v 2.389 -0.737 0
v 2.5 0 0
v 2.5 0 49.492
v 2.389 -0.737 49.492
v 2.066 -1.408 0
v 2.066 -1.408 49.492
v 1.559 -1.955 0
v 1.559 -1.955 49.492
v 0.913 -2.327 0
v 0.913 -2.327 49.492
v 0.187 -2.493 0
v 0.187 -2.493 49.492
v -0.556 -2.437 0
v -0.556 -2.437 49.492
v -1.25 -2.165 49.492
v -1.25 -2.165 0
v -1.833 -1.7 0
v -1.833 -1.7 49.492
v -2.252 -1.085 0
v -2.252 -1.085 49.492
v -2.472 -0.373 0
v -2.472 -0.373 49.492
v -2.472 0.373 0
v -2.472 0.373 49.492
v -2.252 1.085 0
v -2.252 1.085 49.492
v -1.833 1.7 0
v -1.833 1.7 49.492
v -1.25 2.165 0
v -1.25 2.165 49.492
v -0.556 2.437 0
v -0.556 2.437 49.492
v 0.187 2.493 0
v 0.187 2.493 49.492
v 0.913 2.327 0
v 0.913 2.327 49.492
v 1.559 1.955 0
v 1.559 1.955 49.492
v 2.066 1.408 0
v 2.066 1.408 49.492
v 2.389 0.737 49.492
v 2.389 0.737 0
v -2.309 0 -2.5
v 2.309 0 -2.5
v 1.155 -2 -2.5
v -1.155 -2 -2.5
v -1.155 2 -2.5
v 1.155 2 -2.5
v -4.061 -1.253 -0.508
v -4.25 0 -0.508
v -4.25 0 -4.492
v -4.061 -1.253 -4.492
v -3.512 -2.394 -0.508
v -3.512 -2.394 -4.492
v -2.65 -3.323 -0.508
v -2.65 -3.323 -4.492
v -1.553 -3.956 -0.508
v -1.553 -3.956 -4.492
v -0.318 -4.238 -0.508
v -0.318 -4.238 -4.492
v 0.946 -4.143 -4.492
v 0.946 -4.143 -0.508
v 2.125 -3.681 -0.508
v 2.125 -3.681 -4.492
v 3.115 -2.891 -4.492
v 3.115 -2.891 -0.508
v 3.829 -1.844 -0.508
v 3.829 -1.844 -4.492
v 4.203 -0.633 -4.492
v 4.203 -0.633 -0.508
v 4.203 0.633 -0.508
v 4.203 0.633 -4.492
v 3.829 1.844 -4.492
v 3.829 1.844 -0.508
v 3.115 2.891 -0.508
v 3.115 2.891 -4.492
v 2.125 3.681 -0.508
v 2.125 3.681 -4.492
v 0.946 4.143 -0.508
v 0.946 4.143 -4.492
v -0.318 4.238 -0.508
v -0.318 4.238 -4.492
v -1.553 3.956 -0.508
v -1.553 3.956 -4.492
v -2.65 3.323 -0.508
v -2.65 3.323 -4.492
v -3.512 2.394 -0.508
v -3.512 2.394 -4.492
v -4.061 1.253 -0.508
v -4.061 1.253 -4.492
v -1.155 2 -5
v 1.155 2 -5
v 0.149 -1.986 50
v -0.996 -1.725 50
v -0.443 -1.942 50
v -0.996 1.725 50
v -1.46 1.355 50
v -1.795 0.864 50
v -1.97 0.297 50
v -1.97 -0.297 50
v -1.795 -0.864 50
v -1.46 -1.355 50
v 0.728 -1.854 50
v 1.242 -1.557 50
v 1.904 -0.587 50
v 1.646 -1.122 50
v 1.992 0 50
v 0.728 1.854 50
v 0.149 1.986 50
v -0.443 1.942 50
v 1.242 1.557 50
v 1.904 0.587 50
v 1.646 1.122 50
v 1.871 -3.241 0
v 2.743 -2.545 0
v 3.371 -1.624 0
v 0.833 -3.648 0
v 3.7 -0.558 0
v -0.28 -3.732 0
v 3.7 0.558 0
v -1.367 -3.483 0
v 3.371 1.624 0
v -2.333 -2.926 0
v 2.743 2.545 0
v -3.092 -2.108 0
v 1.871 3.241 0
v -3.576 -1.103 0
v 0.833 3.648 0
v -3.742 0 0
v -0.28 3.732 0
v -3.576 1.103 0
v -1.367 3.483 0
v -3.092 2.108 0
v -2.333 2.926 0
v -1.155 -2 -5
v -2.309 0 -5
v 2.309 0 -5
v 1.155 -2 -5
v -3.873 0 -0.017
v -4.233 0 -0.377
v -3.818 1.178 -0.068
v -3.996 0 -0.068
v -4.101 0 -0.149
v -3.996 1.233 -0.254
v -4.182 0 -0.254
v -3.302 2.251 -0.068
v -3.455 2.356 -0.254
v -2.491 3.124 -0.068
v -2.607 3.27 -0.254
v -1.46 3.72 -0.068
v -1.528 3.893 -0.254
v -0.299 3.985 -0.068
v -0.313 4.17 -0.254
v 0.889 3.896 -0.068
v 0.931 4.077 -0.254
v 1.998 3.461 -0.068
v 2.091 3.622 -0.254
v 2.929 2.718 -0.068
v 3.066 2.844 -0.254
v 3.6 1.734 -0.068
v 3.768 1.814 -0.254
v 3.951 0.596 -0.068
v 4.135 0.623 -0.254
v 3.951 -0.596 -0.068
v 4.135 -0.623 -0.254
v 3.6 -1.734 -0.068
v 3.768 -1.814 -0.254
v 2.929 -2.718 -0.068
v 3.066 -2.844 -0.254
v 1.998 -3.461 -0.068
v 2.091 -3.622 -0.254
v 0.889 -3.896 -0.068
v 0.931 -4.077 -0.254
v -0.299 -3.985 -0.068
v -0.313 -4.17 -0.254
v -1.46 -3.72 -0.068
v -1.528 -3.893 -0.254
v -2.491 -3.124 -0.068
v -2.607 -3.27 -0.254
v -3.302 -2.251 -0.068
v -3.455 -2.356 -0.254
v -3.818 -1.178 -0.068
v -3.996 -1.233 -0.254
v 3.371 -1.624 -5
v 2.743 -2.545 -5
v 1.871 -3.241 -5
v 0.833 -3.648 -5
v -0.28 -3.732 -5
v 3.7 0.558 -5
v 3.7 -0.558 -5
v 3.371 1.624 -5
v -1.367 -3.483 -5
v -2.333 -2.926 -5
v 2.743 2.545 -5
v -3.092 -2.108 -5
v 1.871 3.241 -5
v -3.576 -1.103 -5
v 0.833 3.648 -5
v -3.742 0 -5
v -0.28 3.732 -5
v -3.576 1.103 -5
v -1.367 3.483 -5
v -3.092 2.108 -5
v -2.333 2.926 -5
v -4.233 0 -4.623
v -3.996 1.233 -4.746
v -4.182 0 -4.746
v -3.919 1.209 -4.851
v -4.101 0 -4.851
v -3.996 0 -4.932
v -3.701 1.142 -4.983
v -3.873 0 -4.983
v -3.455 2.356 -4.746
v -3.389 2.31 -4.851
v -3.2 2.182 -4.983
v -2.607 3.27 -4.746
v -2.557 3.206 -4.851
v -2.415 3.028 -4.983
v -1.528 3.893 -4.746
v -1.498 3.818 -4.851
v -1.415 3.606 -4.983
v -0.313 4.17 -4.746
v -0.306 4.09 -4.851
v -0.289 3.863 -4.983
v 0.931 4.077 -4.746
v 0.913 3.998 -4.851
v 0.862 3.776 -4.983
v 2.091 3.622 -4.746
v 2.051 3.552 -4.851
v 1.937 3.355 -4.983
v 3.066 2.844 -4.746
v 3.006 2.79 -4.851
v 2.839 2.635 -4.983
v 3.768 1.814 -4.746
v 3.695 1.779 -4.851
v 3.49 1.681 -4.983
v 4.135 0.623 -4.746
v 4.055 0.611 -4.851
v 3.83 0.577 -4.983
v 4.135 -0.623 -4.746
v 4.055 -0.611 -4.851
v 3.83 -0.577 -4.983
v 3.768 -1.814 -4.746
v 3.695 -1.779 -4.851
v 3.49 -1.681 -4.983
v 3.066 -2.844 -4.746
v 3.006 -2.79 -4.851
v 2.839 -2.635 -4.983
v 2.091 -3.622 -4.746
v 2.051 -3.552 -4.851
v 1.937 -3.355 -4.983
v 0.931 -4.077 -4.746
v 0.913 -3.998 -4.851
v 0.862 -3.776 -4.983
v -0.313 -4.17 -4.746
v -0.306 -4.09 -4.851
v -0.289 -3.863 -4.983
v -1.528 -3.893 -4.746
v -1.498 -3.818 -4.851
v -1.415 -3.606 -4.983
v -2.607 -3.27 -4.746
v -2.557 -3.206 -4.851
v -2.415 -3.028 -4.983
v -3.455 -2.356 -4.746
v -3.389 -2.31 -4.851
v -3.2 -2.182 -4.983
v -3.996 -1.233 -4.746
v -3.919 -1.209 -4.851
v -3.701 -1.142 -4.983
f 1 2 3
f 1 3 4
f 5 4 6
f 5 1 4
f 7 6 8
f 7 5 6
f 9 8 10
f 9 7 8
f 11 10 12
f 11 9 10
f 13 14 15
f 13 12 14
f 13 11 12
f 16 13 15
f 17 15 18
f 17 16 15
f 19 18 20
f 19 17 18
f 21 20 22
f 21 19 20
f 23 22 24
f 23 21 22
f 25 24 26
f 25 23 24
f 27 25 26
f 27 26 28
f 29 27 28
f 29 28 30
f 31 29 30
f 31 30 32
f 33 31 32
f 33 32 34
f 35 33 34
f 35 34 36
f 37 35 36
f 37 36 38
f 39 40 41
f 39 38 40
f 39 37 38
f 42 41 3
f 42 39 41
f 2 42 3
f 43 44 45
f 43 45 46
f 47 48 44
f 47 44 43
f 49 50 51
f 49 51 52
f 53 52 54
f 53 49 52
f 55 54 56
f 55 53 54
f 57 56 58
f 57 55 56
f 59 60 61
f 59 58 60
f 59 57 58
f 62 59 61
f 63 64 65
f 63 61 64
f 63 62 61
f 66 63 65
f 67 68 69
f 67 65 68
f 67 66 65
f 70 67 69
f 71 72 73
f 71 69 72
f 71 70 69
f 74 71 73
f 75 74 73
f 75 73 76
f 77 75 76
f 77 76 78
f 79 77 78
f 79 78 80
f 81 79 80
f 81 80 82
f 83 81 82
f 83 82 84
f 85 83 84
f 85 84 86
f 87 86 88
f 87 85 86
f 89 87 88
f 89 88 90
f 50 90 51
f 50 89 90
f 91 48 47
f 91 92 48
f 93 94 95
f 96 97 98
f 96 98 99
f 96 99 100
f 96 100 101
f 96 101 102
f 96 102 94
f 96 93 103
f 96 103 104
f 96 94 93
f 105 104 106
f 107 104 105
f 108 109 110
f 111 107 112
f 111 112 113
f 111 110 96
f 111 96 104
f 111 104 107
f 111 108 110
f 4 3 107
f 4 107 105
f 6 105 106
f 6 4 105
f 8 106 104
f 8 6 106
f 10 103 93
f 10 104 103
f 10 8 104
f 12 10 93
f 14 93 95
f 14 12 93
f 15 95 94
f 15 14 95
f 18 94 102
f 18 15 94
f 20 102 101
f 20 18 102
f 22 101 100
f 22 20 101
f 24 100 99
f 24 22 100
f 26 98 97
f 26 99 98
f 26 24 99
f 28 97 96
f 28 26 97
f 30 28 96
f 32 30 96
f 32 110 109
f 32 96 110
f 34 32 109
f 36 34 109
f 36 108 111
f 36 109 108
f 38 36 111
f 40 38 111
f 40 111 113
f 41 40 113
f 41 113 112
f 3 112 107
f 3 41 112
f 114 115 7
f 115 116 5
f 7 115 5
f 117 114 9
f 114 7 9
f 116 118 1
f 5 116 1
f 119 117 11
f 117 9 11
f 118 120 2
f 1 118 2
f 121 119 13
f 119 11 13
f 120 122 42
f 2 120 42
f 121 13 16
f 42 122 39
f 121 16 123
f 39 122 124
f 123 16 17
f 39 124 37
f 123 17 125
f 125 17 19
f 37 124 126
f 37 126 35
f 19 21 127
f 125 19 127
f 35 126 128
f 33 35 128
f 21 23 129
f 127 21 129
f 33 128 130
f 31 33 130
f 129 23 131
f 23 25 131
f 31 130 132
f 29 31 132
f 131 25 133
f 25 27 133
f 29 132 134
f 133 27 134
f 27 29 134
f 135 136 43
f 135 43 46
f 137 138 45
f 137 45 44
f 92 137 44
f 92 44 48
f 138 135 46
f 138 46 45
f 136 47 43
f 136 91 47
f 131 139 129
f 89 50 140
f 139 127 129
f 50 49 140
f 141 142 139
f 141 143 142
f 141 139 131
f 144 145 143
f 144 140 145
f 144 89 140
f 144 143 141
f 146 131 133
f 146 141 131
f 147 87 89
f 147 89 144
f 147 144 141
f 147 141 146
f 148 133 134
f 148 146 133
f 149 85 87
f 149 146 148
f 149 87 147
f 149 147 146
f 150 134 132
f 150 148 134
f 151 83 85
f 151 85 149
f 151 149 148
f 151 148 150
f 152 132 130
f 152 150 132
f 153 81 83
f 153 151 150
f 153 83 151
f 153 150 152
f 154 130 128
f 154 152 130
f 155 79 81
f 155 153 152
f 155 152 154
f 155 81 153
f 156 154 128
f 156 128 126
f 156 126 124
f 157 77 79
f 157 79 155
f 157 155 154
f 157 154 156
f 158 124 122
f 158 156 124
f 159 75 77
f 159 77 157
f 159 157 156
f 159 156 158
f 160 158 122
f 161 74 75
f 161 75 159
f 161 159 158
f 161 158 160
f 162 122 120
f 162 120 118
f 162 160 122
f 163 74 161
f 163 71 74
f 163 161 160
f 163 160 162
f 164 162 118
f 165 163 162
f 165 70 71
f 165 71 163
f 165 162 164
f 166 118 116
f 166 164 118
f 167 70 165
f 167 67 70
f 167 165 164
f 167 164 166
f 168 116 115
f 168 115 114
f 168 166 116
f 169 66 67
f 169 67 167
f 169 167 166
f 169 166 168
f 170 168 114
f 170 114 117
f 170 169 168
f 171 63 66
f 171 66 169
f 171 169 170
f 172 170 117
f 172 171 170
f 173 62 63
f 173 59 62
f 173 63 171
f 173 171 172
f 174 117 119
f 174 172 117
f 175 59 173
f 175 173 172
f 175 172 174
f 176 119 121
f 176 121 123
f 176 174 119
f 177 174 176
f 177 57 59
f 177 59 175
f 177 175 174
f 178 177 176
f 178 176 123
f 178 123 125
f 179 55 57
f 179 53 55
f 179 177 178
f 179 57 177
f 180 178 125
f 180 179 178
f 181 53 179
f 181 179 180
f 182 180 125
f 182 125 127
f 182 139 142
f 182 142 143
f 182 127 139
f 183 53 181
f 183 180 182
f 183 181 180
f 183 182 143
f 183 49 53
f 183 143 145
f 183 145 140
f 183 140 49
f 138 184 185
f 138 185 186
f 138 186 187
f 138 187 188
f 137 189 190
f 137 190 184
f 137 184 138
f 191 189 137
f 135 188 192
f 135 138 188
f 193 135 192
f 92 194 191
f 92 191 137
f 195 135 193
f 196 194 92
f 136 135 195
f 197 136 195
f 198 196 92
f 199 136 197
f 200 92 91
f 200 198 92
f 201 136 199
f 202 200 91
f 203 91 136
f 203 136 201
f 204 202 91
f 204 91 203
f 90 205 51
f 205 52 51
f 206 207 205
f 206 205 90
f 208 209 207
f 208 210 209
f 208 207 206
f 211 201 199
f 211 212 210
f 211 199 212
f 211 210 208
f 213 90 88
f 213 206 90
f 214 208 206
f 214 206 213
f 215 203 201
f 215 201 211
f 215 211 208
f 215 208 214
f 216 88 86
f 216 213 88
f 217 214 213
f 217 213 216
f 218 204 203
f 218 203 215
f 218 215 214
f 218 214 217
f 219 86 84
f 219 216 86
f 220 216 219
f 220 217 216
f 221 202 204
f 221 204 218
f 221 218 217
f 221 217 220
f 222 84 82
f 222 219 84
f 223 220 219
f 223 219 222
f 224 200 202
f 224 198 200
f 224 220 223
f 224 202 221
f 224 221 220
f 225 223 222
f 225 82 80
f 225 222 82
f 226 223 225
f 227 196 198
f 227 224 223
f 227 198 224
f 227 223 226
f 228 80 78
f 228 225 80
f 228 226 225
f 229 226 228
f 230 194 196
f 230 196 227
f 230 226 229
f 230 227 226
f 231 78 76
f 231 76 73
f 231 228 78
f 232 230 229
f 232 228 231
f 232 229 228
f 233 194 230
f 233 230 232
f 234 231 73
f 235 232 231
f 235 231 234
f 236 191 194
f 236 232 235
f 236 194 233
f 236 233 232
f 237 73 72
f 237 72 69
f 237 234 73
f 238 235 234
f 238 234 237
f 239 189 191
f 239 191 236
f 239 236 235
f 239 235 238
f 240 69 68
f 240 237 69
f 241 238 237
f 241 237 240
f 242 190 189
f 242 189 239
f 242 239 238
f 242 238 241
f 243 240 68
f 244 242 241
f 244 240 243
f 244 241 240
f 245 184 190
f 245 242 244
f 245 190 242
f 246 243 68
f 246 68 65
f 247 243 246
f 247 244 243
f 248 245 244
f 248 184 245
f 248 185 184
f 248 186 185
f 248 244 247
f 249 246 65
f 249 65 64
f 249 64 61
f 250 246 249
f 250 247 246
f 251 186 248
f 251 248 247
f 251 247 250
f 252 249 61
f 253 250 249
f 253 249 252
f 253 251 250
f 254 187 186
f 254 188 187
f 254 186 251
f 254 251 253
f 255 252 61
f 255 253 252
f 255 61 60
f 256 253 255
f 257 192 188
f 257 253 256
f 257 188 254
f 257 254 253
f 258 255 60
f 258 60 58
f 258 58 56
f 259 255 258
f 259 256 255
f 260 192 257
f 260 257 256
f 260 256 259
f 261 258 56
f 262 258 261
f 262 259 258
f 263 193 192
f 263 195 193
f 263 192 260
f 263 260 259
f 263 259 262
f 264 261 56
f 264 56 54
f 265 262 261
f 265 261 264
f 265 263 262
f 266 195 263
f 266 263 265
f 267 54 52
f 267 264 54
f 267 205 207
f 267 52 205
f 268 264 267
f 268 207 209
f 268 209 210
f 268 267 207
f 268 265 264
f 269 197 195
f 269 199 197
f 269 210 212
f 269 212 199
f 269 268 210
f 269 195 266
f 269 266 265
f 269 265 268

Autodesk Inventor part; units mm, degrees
ref_plane "YZ Plane" through (0, 0, 0) normal (1, 0, 0) x (0, 1, 0)
ref_plane "XZ Plane" through (0, 0, 0) normal (0, 1, 0) x (-1, 0, 0)
ref_plane "XY Plane" through (0, 0, 0) normal (0, 0, 1) x (1, 0, 0)
sketch "Sketch1" plane through (0, 0, 0) normal (0, 0, 1) x (1, 0, 0)
  circle A0 centre (0, 0) radius 2.5
  dimension "d0" = 5
extrude "Extrusion1" add sketch "Sketch1" along normal blind 50
sketch "Sketch2" plane through (0, 0, 0) normal (0, 0, -1) x (-1, 0, 0)
  circle A0 centre (0, 0) radius 2.5 projected
  circle A1 centre (0, 0) radius 4.25
  dimension "d3" = 8.5
extrude "Extrusion2" add sketch "Sketch2" along normal blind 5 contours A0 | A1
sketch "Sketch3" plane through (0, 0, -5) normal (0, 0, -1) x (-1, 0, 0)
  circle A0 centre (0, 0) radius 4.25 projected
  line L0 (-1.1547, 2) -> (1.1547, 2)
  line L1 (1.1547, 2) -> (2.3094, 0)
  line L2 (2.3094, 0) -> (1.1547, -2)
  line L3 (1.1547, -2) -> (-1.1547, -2)
  line L4 (-1.1547, -2) -> (-2.3094, 0)
  line L5 (-2.3094, 0) -> (-1.1547, 2)
  dimension "d6" = 4
extrude "Extrusion3" cut sketch "Sketch3" against normal blind 2.5 contours L0 L1 L2 L3 L4 L5
thread "Thread1" size "12-24 UNC" class "2A" standard "ANSI Unified Screw Threads" length 22
chamfer "Chamfer1" distance 0.508 angle 45 1 edges at (-2.5, 0, 50)
fillet "Fillet1" radius 0.508 2 edges at (4.25, 0, -5) (4.25, 0, 0)
properties part number "m5 x50" material "Steel"
